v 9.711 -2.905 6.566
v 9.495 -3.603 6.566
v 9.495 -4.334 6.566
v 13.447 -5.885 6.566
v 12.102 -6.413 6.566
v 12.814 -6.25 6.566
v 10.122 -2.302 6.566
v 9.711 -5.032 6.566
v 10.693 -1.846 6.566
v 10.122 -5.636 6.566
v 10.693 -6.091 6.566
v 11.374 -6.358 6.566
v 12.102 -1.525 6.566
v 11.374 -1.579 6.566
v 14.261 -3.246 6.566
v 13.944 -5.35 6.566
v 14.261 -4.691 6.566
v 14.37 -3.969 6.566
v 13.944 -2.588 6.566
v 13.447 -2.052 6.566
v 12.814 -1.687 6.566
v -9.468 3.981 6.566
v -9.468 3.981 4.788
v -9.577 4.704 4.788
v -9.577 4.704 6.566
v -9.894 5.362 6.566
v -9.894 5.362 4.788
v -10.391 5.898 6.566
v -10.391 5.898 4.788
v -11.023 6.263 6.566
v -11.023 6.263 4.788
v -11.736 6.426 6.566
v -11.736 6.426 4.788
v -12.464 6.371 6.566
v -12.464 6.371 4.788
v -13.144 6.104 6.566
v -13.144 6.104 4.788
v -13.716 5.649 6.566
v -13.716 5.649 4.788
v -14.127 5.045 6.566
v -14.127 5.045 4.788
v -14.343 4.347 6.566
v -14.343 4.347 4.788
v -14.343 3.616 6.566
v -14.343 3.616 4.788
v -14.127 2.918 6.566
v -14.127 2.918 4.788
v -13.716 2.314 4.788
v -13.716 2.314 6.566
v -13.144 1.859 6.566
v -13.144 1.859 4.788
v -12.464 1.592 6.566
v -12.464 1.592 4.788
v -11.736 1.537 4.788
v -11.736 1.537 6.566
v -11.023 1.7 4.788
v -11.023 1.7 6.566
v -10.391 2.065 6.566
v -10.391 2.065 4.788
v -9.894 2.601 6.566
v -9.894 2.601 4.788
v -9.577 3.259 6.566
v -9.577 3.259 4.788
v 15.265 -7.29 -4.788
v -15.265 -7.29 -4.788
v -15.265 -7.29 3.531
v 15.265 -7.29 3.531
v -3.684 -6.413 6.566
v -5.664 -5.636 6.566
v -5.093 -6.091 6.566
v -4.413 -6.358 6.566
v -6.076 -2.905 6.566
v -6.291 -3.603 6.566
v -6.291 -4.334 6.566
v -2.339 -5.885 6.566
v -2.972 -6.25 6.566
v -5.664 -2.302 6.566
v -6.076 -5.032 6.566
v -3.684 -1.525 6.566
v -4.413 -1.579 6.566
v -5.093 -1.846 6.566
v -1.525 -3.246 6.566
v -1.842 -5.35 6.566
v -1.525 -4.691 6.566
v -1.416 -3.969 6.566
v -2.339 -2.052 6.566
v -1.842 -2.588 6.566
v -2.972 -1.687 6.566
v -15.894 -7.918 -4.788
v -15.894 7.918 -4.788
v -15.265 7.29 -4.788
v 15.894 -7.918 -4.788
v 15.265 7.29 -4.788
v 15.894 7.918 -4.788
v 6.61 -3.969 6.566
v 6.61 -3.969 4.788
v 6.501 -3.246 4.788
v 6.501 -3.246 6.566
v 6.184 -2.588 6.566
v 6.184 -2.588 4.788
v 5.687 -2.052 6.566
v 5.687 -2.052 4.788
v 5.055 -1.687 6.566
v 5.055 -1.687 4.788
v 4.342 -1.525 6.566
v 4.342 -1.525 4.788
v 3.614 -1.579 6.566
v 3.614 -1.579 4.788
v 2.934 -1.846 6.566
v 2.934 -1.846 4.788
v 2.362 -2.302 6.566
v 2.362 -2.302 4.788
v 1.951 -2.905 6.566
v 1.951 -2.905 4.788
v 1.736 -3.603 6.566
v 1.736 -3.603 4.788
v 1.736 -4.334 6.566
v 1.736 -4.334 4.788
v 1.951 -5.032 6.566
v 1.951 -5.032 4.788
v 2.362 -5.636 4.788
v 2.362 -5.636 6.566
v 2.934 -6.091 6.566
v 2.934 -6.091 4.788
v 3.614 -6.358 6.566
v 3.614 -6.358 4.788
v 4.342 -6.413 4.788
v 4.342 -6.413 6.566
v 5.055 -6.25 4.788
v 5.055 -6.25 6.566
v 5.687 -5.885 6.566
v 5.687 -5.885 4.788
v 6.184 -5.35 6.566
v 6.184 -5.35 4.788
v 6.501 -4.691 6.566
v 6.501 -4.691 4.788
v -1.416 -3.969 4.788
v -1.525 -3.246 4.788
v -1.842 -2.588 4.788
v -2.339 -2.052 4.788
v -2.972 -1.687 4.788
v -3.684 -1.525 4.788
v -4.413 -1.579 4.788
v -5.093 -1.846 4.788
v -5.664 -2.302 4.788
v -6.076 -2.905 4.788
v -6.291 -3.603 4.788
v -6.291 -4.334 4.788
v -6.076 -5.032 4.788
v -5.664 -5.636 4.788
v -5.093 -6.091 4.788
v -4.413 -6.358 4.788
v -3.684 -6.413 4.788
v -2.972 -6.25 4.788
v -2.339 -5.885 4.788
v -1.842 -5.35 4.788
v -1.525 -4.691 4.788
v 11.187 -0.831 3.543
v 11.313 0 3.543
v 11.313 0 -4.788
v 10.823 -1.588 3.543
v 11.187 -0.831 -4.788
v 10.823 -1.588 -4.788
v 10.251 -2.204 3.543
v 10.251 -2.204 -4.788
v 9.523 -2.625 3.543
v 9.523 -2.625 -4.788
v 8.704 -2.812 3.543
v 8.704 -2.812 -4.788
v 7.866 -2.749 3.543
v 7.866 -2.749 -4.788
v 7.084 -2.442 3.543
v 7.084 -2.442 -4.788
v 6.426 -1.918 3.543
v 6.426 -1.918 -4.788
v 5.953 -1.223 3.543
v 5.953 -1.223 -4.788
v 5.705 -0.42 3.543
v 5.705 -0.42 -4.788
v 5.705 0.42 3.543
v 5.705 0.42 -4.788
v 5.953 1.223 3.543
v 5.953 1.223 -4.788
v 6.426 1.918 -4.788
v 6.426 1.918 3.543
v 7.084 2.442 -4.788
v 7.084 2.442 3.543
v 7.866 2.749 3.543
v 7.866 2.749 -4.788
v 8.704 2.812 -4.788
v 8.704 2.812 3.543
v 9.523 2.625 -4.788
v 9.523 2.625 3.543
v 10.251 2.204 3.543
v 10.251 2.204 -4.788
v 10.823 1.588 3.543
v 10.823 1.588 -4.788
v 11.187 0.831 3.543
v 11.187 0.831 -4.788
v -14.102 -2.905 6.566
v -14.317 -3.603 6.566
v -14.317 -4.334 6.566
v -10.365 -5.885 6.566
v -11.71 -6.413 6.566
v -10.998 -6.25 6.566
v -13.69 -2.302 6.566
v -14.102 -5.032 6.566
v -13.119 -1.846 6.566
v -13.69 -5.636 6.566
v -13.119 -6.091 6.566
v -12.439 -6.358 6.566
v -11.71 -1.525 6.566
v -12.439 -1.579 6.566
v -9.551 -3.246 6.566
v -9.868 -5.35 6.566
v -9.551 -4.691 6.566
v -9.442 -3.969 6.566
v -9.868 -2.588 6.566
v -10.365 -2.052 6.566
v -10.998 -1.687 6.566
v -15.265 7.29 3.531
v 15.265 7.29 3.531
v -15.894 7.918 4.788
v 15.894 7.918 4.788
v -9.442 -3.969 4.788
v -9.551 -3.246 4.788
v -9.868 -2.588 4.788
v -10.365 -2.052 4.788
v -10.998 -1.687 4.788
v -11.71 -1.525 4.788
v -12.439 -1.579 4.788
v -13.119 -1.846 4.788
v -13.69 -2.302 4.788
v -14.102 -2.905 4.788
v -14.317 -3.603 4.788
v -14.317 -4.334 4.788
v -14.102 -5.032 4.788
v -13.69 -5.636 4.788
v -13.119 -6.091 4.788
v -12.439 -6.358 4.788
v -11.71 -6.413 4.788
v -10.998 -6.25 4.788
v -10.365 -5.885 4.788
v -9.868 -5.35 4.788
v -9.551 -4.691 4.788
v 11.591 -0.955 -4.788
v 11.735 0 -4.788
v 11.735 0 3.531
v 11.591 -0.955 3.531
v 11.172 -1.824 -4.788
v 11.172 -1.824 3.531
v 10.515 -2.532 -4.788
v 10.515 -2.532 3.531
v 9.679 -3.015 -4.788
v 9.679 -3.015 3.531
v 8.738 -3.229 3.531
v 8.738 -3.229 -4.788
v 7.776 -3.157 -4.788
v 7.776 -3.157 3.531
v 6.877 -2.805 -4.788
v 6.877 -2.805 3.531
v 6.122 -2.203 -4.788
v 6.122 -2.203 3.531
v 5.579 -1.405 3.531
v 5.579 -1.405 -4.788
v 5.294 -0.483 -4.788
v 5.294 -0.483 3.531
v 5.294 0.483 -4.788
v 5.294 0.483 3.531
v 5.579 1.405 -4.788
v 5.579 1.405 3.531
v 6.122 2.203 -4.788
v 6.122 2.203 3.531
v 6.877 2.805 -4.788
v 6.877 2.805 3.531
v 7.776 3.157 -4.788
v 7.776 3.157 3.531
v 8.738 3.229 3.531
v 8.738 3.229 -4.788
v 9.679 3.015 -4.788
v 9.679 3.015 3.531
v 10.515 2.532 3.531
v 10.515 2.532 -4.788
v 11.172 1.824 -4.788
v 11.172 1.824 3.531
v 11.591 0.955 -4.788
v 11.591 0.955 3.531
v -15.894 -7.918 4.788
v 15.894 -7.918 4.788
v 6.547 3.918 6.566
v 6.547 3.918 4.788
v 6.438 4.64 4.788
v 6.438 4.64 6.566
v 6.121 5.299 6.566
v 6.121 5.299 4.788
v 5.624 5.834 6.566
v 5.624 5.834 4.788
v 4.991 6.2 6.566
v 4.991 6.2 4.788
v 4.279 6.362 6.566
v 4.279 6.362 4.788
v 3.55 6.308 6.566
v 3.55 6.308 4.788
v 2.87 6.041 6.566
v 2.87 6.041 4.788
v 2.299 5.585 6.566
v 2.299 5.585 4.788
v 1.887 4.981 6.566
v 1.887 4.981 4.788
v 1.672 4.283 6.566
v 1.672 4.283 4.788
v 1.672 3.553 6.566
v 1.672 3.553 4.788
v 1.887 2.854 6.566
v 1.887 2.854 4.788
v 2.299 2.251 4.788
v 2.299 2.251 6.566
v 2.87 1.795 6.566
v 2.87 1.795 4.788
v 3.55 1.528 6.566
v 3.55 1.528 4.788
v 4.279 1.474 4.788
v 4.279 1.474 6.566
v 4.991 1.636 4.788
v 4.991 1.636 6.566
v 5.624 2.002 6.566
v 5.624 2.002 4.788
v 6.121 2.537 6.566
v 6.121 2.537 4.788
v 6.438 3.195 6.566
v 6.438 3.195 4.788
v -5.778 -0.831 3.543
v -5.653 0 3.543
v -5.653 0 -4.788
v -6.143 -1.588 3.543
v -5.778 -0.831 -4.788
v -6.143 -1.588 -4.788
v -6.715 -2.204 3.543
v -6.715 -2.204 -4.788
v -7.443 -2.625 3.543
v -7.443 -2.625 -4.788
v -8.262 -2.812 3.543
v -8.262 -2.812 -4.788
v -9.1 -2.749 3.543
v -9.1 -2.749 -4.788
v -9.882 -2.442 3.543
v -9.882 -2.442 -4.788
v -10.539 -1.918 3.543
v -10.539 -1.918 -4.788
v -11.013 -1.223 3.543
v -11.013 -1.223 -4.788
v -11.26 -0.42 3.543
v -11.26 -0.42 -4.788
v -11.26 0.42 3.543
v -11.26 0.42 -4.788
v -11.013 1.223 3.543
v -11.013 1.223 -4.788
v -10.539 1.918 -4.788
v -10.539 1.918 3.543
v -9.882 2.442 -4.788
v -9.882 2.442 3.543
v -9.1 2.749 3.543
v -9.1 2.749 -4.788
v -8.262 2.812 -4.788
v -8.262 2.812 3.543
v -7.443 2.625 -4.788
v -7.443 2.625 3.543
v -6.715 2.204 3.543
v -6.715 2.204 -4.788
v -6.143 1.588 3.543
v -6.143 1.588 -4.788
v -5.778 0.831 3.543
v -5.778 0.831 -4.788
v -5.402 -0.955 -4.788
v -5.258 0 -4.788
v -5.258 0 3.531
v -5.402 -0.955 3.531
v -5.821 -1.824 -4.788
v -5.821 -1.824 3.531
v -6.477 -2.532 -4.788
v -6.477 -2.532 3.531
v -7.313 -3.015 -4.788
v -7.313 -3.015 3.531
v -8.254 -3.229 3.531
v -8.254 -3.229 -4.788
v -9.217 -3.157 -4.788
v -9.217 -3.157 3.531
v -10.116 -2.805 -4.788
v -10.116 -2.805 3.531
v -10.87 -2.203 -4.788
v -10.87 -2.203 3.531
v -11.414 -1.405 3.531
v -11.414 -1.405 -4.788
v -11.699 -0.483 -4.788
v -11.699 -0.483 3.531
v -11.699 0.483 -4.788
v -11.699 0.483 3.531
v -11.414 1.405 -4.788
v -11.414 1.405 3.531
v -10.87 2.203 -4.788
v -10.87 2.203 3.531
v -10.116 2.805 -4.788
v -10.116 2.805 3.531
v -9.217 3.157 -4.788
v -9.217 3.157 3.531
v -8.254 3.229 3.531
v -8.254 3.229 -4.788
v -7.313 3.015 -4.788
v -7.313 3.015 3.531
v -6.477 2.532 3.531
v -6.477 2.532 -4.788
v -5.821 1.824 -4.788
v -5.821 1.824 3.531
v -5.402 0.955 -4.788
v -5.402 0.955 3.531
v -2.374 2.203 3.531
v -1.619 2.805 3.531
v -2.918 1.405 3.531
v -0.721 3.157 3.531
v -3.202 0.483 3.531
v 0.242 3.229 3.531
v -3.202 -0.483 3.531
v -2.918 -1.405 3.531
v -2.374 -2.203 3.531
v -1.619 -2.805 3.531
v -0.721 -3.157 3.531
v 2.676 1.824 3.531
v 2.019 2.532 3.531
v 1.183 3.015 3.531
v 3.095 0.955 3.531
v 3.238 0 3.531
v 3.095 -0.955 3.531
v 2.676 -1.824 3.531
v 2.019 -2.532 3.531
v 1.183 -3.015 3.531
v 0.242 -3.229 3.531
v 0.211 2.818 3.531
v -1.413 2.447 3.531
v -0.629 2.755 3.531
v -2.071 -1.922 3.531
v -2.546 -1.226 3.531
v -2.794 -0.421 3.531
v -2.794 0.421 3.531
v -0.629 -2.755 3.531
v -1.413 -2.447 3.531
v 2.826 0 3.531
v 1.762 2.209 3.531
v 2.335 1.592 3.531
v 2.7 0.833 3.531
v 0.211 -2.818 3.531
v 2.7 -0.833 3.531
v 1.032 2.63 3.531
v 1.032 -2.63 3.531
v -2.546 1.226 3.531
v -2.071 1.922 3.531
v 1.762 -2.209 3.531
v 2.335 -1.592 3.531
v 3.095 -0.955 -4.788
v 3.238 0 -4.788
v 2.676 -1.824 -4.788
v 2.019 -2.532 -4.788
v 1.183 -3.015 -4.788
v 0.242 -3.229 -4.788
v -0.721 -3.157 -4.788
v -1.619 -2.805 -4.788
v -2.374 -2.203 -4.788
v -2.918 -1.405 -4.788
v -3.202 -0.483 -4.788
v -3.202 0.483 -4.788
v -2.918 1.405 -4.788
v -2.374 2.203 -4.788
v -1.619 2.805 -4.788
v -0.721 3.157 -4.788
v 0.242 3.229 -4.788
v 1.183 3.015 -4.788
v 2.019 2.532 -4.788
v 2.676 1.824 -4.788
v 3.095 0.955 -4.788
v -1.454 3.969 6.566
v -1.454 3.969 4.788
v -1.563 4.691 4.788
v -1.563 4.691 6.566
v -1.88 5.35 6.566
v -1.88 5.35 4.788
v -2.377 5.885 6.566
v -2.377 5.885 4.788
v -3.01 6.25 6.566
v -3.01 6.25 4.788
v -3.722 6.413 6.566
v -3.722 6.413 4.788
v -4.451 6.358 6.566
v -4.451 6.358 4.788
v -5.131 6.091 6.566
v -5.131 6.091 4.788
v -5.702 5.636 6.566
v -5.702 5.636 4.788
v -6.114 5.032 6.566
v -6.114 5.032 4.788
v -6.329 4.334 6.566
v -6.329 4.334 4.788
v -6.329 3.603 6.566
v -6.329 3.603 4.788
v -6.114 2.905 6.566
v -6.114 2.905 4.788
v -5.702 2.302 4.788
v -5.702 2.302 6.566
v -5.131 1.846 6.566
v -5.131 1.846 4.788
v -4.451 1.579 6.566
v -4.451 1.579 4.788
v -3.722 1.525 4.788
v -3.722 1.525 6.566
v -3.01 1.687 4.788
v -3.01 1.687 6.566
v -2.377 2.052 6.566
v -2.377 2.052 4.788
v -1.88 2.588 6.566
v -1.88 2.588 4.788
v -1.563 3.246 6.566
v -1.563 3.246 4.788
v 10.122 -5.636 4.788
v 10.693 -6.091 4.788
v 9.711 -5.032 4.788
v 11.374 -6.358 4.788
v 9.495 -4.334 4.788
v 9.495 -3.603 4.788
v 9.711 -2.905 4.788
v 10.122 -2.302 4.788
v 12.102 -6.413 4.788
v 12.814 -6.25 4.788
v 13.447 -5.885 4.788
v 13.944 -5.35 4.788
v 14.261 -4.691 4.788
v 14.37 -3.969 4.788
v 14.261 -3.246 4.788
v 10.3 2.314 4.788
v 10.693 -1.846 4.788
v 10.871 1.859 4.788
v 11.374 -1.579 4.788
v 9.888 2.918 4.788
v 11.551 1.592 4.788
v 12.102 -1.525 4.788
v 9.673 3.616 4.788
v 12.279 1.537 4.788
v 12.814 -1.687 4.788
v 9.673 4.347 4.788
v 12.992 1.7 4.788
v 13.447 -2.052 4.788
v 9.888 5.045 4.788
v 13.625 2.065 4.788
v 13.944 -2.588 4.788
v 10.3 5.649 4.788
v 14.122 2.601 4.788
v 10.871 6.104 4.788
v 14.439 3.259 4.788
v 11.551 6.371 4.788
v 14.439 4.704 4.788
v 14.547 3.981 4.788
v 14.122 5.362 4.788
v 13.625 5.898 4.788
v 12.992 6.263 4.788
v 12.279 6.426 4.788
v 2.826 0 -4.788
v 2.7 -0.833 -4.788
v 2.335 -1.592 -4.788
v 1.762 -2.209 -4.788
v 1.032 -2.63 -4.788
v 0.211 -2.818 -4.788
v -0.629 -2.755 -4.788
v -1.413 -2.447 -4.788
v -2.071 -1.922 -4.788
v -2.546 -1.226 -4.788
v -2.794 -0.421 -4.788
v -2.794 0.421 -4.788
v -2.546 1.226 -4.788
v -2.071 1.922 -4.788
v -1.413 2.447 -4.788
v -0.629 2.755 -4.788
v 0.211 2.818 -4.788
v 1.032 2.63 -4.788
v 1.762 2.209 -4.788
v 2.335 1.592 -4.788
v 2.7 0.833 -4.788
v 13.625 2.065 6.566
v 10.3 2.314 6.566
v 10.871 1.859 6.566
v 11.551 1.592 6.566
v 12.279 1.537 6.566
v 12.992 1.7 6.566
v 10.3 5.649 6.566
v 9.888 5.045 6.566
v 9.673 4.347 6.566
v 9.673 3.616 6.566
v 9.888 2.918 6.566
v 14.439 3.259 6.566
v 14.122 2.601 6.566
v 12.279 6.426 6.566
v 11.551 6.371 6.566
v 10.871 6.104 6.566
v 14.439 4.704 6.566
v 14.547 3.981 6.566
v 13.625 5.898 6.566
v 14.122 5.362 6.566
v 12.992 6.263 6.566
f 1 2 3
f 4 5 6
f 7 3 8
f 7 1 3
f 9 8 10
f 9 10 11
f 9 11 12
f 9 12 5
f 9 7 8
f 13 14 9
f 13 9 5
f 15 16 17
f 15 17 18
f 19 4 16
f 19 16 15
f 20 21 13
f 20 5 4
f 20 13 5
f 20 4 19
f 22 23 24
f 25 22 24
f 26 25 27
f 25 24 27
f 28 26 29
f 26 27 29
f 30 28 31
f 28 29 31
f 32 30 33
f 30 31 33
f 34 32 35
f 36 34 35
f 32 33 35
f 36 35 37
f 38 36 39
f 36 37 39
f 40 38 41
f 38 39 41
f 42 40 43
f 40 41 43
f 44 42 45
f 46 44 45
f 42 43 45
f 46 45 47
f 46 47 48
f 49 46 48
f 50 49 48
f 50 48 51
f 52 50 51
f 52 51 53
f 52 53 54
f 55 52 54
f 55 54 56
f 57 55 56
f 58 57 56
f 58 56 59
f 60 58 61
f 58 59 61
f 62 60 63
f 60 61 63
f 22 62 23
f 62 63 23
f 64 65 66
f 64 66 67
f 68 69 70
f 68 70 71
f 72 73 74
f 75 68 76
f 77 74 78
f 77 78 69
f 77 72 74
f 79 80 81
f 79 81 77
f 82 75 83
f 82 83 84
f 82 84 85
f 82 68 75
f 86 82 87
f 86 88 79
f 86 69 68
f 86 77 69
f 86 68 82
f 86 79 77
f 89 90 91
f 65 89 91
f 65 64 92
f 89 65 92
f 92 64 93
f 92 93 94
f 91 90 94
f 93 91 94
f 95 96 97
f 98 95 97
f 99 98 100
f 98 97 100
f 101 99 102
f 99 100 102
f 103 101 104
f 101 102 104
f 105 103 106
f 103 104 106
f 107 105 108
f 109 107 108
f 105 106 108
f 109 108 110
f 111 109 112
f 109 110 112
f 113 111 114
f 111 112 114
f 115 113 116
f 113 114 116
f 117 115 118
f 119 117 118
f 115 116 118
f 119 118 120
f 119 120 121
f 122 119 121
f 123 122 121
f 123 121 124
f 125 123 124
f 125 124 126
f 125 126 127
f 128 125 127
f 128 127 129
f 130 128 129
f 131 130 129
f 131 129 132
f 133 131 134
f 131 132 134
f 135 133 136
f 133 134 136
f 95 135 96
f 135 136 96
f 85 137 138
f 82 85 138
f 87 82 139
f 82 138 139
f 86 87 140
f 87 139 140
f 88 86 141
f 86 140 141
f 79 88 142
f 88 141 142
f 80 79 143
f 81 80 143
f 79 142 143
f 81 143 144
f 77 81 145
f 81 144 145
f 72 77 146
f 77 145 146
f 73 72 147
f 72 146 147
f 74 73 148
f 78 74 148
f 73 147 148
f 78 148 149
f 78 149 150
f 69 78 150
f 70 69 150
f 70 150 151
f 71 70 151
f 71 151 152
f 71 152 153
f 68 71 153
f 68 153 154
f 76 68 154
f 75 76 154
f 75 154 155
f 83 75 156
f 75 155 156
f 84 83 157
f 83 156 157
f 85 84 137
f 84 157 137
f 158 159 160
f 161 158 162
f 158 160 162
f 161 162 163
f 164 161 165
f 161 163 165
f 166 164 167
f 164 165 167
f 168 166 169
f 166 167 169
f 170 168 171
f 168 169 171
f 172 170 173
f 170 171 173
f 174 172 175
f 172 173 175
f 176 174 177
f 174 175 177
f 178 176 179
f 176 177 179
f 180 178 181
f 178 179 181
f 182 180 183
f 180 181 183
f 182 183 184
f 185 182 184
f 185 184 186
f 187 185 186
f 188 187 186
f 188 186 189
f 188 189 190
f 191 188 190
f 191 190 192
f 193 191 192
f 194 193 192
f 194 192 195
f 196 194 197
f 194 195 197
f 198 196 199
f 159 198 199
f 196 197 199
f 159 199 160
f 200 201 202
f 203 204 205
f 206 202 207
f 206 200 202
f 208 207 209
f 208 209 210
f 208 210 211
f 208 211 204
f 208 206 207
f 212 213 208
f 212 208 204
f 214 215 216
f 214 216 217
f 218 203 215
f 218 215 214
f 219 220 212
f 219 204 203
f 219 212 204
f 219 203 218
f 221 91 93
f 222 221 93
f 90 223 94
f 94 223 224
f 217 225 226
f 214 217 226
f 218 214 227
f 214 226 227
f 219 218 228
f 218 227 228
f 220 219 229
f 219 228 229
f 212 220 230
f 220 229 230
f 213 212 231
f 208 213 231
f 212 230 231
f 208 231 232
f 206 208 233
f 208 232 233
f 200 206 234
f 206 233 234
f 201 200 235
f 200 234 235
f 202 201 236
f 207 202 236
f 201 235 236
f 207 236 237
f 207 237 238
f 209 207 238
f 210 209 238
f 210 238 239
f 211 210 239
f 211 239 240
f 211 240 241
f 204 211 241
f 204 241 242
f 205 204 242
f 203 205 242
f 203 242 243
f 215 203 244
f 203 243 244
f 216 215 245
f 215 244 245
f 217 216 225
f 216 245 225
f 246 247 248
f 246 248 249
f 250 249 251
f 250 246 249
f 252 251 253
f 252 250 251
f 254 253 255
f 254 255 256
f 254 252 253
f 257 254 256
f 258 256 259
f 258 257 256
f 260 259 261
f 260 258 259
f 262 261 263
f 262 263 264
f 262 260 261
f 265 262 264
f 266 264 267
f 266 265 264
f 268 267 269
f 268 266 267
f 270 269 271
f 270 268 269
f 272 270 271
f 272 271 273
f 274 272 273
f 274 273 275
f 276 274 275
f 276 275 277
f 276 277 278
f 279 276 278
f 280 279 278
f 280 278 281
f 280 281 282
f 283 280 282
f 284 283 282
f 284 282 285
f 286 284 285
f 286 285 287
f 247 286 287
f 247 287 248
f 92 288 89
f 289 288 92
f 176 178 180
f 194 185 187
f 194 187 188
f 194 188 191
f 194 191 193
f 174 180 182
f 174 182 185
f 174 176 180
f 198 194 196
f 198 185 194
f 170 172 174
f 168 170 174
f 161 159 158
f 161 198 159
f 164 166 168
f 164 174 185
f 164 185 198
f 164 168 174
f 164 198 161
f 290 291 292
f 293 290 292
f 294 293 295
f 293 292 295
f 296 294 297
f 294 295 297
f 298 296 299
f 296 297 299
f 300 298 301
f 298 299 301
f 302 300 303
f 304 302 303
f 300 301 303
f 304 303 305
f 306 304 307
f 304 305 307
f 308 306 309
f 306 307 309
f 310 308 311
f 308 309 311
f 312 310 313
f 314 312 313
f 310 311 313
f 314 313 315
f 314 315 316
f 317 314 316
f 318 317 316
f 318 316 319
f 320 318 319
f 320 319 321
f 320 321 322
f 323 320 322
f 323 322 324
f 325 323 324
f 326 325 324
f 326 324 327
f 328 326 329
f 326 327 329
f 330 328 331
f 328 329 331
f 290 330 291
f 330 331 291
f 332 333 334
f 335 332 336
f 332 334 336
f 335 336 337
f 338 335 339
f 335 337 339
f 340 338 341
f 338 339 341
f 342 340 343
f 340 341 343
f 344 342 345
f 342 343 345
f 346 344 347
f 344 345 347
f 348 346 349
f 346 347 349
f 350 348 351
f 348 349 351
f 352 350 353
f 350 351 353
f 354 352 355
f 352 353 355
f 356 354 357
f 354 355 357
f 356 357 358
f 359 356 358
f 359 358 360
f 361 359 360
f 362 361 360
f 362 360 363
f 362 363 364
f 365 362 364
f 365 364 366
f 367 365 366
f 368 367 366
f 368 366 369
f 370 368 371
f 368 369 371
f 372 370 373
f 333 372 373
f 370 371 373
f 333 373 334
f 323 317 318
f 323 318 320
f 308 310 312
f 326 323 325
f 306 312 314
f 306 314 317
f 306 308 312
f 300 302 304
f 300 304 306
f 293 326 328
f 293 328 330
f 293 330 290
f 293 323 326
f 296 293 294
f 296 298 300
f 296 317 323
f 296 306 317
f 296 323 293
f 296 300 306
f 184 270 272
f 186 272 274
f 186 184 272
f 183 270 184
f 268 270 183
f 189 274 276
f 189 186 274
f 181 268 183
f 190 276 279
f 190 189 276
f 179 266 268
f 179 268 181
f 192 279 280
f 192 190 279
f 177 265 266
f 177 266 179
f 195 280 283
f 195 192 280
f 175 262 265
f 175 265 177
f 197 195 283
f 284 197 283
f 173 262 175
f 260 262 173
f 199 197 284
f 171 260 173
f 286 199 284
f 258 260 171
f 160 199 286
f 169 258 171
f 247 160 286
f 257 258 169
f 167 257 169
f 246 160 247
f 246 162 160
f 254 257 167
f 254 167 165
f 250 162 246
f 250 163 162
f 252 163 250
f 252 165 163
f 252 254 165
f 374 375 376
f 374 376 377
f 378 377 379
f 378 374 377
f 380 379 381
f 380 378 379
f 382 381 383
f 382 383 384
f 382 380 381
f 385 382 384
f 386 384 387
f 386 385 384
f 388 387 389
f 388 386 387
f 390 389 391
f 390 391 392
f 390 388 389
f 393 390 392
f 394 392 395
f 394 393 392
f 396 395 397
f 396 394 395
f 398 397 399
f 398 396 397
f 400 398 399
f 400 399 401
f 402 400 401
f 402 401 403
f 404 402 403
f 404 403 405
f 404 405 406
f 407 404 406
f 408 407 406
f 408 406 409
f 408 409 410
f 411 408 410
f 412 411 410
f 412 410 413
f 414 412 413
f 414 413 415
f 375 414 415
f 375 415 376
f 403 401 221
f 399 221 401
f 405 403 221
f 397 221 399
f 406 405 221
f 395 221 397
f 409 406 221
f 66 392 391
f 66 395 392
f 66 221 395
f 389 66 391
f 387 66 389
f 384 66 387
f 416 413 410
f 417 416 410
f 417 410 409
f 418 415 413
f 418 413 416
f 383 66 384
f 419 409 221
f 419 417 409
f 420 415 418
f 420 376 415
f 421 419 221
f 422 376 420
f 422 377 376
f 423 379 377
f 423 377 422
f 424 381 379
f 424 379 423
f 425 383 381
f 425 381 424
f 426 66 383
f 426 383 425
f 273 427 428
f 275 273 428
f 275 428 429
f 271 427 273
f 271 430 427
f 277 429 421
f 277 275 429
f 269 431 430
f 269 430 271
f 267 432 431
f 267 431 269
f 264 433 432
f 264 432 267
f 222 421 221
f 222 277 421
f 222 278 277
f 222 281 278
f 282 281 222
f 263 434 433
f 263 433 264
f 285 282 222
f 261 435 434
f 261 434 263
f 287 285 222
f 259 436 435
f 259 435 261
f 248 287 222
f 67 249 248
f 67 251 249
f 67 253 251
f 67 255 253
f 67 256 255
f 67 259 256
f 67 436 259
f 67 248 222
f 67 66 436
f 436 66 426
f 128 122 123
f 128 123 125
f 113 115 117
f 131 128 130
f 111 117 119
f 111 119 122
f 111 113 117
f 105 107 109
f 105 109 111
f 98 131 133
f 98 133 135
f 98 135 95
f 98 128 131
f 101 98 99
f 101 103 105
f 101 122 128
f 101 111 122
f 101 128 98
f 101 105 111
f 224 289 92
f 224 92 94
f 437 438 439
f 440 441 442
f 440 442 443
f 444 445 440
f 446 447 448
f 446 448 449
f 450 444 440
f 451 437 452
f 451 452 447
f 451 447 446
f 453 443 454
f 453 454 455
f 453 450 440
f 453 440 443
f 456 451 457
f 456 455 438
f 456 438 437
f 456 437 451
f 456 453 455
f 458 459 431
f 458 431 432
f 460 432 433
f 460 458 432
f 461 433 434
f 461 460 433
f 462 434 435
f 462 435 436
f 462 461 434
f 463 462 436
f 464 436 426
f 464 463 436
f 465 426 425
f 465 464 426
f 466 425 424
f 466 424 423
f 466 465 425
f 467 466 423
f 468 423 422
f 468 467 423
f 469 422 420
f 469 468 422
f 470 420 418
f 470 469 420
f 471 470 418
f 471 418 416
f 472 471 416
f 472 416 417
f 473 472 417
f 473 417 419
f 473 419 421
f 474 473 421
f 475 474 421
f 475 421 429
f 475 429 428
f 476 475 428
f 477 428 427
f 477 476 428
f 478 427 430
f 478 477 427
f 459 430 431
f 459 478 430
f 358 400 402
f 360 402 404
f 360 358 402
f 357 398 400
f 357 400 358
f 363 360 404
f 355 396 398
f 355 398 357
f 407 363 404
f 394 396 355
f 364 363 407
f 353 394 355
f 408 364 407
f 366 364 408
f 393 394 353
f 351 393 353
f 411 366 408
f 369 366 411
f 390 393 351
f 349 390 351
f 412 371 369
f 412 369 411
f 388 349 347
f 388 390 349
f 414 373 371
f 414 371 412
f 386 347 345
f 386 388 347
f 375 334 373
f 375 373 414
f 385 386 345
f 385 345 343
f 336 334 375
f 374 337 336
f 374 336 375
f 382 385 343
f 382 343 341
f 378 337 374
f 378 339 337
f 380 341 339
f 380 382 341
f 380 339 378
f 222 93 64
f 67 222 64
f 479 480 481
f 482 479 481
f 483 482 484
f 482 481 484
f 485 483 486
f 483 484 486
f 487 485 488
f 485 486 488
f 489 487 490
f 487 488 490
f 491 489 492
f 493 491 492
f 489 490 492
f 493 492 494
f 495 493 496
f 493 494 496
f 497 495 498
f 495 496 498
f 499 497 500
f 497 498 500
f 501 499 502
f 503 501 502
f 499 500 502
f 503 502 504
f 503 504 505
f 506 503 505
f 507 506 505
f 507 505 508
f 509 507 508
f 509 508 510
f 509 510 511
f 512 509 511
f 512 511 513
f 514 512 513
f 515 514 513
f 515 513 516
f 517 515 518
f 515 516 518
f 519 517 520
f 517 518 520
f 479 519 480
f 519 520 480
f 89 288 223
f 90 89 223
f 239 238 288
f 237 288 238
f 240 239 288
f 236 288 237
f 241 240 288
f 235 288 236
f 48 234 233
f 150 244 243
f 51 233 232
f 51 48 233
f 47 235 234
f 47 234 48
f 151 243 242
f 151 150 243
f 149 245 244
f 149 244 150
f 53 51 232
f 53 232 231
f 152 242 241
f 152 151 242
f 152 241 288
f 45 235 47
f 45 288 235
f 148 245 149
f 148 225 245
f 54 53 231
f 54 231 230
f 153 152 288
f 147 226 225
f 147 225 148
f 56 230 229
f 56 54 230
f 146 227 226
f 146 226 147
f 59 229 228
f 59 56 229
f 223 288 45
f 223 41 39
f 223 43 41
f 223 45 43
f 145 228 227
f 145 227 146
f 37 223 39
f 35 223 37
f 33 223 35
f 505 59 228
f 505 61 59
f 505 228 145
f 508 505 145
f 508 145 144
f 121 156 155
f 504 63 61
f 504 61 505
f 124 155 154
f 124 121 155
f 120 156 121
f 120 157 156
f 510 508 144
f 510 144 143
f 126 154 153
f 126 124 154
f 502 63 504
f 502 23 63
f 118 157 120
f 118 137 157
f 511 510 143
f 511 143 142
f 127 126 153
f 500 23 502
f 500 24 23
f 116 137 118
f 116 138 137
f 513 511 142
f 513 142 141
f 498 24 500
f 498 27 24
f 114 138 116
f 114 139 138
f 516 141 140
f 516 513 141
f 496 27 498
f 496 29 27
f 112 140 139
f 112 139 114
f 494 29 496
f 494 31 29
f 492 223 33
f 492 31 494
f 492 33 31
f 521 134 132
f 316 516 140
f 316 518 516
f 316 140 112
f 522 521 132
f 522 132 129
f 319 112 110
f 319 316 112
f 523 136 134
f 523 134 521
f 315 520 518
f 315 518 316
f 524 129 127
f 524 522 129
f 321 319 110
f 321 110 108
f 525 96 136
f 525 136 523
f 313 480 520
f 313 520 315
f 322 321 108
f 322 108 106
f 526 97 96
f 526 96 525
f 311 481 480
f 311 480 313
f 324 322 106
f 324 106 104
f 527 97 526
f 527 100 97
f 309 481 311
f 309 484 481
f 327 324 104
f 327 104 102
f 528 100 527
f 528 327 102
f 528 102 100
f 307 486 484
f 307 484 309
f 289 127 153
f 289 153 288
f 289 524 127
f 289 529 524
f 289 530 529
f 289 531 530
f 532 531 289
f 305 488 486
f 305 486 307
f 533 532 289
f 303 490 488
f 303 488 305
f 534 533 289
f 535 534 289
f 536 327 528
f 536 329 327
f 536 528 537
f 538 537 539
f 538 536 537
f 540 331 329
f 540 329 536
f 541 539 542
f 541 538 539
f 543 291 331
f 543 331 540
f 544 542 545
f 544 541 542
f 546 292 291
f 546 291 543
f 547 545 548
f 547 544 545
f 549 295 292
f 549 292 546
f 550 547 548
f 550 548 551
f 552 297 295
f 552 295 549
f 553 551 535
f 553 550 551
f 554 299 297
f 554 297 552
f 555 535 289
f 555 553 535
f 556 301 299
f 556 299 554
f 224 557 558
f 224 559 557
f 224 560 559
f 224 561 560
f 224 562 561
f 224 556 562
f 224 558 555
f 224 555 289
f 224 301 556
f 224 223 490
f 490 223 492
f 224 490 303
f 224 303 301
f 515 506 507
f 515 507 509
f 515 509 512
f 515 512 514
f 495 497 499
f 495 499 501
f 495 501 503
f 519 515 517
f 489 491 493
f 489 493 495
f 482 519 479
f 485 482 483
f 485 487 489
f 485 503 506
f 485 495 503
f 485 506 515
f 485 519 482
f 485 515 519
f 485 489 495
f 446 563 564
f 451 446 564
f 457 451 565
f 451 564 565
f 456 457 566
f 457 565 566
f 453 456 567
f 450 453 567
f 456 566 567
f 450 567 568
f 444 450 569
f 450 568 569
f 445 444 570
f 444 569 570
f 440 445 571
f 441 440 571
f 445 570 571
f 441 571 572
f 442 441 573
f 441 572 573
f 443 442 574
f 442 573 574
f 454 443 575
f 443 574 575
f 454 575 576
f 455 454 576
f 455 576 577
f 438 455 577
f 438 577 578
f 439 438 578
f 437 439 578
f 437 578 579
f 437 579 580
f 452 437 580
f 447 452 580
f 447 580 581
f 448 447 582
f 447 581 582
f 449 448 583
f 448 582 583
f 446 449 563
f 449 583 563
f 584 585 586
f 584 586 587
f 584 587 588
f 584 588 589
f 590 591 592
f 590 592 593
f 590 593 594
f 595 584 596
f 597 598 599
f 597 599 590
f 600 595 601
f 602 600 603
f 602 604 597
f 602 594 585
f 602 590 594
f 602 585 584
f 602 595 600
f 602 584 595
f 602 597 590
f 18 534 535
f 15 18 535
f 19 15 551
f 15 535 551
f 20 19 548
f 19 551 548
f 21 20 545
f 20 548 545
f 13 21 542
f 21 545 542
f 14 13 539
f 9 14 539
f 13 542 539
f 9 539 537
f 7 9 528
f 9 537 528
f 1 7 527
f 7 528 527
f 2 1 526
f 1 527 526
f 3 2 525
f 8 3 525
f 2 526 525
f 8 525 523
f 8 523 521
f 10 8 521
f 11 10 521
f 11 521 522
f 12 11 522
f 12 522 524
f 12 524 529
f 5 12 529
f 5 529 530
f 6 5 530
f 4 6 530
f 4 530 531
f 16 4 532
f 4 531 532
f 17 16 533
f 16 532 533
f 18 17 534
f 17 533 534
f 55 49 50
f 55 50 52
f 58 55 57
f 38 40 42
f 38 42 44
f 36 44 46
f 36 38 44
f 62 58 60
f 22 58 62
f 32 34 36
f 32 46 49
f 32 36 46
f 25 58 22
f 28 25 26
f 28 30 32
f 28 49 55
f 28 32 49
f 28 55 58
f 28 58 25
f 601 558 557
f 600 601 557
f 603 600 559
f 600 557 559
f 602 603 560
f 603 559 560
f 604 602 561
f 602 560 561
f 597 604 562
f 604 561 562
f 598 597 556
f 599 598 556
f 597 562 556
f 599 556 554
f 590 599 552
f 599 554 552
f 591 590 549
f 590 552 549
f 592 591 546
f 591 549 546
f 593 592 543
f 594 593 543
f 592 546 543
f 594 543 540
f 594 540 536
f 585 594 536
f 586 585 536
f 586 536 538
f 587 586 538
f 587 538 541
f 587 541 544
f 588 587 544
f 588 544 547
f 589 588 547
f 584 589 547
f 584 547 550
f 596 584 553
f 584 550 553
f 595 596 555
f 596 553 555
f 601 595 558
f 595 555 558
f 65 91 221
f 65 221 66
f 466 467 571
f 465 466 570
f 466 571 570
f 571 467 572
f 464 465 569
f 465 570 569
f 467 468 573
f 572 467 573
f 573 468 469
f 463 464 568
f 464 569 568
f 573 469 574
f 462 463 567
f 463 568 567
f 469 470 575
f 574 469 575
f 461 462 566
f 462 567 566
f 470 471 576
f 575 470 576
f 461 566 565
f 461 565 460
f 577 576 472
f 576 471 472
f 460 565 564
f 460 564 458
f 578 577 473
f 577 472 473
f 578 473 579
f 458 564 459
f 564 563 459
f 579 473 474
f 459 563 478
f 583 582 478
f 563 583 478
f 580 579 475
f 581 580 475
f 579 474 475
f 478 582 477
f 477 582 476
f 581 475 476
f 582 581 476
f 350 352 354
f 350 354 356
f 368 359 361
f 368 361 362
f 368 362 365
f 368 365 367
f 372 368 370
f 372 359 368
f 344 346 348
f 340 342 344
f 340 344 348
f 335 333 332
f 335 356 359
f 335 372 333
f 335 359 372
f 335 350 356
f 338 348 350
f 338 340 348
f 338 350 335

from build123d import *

# Parameters (mm, degrees)
F0_W      = 31.7881
F0_H      = 15.8369
F1_DEPTH  = 4.7879
F2_R      = 2.4511
F3_DEPTH  = 1.778
F4_R      = 2.4511
F5_DEPTH  = 1.778
F6_R      = 2.4511
F7_DEPTH  = 1.778
F8_R      = 2.4511
F9_DEPTH  = 1.778
F10_R     = 2.4511
F11_DEPTH = 1.778
F12_R     = 2.4511
F13_DEPTH = 1.778
F14_R     = 2.4511
F15_DEPTH = 1.778
F16_R     = 2.4511
F17_DEPTH = 1.778
F20_R     = 2.82575
F22_DEPTH = 8.3185
F20_W     = 30.5308
F20_H     = 14.5796
F20_R_2   = 3.2385
F23_DEPTH = 8.3185
F24_R     = 3.2385
F28_DEPTH = 8.3312
F25_R     = 3.2385
F29_DEPTH = 8.3312
F26_R     = 2.8194
F30_DEPTH = 8.3312
F27_R     = 2.8194
F31_DEPTH = 8.3312


# Not quite as in the source:
# - the program builds the solid bodies; features that only make, move or delete a surface that nothing else refers to are left out


with BuildPart() as f1:
    # F0 (on Top) → F1 (new body, symmetric)
    with BuildSketch(Plane.XY):
        Rectangle(F0_W, F0_H)
    extrude(amount=F1_DEPTH, both=True)

    # F2 (on face) → F3 (join)
    with BuildSketch(Plane.XY.offset(4.7879)):
        with Locations((-11.91895, 3.98145)):
            Circle(F2_R)
    extrude(amount=F3_DEPTH)

    # F4 (on face) → F5 (join)
    with BuildSketch(Plane.XY.offset(4.7879)):
        with Locations((-3.9052600634, 3.96875)):
            Circle(F4_R)
    extrude(amount=F5_DEPTH)

    # F6 (on face) → F7 (join)
    with BuildSketch(Plane.XY.offset(4.7879)):
        with Locations((4.0955786651, 3.91795)):
            Circle(F6_R)
    extrude(amount=F7_DEPTH)

    # F8 (on face) → F9 (join)
    with BuildSketch(Plane.XY.offset(4.7879)):
        with Locations((12.096326677, 3.98145)):
            Circle(F8_R)
    extrude(amount=F9_DEPTH)

    # F10 (on face) → F11 (join)
    with BuildSketch(Plane.XY.offset(4.7879)):
        with Locations((-11.89355, -3.96875)):
            Circle(F10_R)
    extrude(amount=F11_DEPTH)

    # F12 (on face) → F13 (join)
    with BuildSketch(Plane.XY.offset(4.7879)):
        with Locations((-3.86715, -3.96875)):
            Circle(F12_R)
    extrude(amount=F13_DEPTH)

    # F14 (on face) → F15 (join)
    with BuildSketch(Plane.XY.offset(4.7879)):
        with Locations((4.15925, -3.96875)):
            Circle(F14_R)
    extrude(amount=F15_DEPTH)

    # F16 (on face) → F17 (join)
    with BuildSketch(Plane.XY.offset(4.7879)):
        with Locations((11.91895, -3.96875)):
            Circle(F16_R)
    extrude(amount=F17_DEPTH)

    # F20 (on face) → F22 (cut)
    with BuildSketch(Plane(origin=(0, 0, -4.7879), x_dir=(1, 0, 0), z_dir=(0, 0, -1))):
        Circle(F20_R)
    extrude(amount=-F22_DEPTH, mode=Mode.SUBTRACT)

    # F20 (on face) → F23 (cut)
    with BuildSketch(Plane(origin=(0, 0, -4.7879), x_dir=(1, 0, 0), z_dir=(0, 0, -1))):
        Rectangle(F20_W, F20_H)
        Circle(F20_R_2, mode=Mode.SUBTRACT)
    extrude(amount=-F23_DEPTH, mode=Mode.SUBTRACT)

    # F24 (on face) → F28 (join)
    with BuildSketch(Plane(origin=(0, 0, -4.7879), x_dir=(1, 0, 0), z_dir=(0, 0, -1))):
        with Locations((-8.4963, 0)):
            Circle(F24_R)
    extrude(amount=-F28_DEPTH)

    # F25 (on face) → F29 (join)
    with BuildSketch(Plane(origin=(0, 0, -4.7879), x_dir=(1, 0, 0), z_dir=(0, 0, -1))):
        with Locations((8.4963, 0)):
            Circle(F25_R)
    extrude(amount=-F29_DEPTH)

    # F26 (on face) → F30 (cut)
    with BuildSketch(Plane(origin=(0, 0, -4.7879), x_dir=(1, 0, 0), z_dir=(0, 0, -1))):
        with Locations((-8.472575021, 0)):
            Circle(F26_R)
    extrude(amount=-F30_DEPTH, mode=Mode.SUBTRACT)

    # F27 (on face) → F31 (cut)
    with BuildSketch(Plane(origin=(0, 0, -4.7879), x_dir=(1, 0, 0), z_dir=(0, 0, -1))):
        with Locations((8.4932660684, 0)):
            Circle(F27_R)
    extrude(amount=-F31_DEPTH, mode=Mode.SUBTRACT)


solid = f1.part
